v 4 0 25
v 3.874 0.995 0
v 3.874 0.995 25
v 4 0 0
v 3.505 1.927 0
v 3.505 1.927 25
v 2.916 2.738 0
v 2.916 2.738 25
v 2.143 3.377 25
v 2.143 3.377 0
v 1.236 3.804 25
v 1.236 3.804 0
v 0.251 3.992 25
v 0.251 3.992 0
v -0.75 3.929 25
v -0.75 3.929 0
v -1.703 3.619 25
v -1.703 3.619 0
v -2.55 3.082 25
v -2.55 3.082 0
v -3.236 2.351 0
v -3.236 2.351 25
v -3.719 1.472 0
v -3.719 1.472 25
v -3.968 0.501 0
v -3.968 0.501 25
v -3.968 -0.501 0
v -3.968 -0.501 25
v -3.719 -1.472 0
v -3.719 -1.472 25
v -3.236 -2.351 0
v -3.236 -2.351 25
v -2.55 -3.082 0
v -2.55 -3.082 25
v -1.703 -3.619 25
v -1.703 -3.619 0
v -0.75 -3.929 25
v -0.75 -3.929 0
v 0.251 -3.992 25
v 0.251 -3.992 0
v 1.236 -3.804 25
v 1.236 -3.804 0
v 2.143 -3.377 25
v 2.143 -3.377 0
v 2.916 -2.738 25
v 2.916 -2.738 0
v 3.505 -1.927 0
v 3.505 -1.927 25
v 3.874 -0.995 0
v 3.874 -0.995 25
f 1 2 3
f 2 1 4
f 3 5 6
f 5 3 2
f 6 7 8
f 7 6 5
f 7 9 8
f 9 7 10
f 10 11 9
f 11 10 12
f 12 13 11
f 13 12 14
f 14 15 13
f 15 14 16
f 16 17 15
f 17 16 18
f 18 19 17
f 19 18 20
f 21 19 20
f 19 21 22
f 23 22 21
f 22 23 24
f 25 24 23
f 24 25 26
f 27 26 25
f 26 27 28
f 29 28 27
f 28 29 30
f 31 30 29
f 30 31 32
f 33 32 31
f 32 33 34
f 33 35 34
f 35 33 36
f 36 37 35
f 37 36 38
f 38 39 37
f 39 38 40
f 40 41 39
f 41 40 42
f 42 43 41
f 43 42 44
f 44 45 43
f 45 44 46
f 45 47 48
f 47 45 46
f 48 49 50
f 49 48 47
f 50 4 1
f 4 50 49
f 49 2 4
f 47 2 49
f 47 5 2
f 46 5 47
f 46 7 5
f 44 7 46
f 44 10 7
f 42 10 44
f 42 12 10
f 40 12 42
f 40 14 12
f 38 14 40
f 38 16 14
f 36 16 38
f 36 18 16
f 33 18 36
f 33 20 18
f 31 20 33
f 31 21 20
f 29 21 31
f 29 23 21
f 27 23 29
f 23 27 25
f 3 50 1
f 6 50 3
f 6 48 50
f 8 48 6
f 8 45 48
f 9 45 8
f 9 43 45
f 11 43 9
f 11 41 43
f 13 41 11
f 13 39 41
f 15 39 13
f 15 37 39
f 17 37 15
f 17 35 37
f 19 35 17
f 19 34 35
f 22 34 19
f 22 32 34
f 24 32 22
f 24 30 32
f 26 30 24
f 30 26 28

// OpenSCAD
$fn = 25;

bearing_inner_diameter = 8;
roller_length = 25;
cylinder(roller_length, d=8);
